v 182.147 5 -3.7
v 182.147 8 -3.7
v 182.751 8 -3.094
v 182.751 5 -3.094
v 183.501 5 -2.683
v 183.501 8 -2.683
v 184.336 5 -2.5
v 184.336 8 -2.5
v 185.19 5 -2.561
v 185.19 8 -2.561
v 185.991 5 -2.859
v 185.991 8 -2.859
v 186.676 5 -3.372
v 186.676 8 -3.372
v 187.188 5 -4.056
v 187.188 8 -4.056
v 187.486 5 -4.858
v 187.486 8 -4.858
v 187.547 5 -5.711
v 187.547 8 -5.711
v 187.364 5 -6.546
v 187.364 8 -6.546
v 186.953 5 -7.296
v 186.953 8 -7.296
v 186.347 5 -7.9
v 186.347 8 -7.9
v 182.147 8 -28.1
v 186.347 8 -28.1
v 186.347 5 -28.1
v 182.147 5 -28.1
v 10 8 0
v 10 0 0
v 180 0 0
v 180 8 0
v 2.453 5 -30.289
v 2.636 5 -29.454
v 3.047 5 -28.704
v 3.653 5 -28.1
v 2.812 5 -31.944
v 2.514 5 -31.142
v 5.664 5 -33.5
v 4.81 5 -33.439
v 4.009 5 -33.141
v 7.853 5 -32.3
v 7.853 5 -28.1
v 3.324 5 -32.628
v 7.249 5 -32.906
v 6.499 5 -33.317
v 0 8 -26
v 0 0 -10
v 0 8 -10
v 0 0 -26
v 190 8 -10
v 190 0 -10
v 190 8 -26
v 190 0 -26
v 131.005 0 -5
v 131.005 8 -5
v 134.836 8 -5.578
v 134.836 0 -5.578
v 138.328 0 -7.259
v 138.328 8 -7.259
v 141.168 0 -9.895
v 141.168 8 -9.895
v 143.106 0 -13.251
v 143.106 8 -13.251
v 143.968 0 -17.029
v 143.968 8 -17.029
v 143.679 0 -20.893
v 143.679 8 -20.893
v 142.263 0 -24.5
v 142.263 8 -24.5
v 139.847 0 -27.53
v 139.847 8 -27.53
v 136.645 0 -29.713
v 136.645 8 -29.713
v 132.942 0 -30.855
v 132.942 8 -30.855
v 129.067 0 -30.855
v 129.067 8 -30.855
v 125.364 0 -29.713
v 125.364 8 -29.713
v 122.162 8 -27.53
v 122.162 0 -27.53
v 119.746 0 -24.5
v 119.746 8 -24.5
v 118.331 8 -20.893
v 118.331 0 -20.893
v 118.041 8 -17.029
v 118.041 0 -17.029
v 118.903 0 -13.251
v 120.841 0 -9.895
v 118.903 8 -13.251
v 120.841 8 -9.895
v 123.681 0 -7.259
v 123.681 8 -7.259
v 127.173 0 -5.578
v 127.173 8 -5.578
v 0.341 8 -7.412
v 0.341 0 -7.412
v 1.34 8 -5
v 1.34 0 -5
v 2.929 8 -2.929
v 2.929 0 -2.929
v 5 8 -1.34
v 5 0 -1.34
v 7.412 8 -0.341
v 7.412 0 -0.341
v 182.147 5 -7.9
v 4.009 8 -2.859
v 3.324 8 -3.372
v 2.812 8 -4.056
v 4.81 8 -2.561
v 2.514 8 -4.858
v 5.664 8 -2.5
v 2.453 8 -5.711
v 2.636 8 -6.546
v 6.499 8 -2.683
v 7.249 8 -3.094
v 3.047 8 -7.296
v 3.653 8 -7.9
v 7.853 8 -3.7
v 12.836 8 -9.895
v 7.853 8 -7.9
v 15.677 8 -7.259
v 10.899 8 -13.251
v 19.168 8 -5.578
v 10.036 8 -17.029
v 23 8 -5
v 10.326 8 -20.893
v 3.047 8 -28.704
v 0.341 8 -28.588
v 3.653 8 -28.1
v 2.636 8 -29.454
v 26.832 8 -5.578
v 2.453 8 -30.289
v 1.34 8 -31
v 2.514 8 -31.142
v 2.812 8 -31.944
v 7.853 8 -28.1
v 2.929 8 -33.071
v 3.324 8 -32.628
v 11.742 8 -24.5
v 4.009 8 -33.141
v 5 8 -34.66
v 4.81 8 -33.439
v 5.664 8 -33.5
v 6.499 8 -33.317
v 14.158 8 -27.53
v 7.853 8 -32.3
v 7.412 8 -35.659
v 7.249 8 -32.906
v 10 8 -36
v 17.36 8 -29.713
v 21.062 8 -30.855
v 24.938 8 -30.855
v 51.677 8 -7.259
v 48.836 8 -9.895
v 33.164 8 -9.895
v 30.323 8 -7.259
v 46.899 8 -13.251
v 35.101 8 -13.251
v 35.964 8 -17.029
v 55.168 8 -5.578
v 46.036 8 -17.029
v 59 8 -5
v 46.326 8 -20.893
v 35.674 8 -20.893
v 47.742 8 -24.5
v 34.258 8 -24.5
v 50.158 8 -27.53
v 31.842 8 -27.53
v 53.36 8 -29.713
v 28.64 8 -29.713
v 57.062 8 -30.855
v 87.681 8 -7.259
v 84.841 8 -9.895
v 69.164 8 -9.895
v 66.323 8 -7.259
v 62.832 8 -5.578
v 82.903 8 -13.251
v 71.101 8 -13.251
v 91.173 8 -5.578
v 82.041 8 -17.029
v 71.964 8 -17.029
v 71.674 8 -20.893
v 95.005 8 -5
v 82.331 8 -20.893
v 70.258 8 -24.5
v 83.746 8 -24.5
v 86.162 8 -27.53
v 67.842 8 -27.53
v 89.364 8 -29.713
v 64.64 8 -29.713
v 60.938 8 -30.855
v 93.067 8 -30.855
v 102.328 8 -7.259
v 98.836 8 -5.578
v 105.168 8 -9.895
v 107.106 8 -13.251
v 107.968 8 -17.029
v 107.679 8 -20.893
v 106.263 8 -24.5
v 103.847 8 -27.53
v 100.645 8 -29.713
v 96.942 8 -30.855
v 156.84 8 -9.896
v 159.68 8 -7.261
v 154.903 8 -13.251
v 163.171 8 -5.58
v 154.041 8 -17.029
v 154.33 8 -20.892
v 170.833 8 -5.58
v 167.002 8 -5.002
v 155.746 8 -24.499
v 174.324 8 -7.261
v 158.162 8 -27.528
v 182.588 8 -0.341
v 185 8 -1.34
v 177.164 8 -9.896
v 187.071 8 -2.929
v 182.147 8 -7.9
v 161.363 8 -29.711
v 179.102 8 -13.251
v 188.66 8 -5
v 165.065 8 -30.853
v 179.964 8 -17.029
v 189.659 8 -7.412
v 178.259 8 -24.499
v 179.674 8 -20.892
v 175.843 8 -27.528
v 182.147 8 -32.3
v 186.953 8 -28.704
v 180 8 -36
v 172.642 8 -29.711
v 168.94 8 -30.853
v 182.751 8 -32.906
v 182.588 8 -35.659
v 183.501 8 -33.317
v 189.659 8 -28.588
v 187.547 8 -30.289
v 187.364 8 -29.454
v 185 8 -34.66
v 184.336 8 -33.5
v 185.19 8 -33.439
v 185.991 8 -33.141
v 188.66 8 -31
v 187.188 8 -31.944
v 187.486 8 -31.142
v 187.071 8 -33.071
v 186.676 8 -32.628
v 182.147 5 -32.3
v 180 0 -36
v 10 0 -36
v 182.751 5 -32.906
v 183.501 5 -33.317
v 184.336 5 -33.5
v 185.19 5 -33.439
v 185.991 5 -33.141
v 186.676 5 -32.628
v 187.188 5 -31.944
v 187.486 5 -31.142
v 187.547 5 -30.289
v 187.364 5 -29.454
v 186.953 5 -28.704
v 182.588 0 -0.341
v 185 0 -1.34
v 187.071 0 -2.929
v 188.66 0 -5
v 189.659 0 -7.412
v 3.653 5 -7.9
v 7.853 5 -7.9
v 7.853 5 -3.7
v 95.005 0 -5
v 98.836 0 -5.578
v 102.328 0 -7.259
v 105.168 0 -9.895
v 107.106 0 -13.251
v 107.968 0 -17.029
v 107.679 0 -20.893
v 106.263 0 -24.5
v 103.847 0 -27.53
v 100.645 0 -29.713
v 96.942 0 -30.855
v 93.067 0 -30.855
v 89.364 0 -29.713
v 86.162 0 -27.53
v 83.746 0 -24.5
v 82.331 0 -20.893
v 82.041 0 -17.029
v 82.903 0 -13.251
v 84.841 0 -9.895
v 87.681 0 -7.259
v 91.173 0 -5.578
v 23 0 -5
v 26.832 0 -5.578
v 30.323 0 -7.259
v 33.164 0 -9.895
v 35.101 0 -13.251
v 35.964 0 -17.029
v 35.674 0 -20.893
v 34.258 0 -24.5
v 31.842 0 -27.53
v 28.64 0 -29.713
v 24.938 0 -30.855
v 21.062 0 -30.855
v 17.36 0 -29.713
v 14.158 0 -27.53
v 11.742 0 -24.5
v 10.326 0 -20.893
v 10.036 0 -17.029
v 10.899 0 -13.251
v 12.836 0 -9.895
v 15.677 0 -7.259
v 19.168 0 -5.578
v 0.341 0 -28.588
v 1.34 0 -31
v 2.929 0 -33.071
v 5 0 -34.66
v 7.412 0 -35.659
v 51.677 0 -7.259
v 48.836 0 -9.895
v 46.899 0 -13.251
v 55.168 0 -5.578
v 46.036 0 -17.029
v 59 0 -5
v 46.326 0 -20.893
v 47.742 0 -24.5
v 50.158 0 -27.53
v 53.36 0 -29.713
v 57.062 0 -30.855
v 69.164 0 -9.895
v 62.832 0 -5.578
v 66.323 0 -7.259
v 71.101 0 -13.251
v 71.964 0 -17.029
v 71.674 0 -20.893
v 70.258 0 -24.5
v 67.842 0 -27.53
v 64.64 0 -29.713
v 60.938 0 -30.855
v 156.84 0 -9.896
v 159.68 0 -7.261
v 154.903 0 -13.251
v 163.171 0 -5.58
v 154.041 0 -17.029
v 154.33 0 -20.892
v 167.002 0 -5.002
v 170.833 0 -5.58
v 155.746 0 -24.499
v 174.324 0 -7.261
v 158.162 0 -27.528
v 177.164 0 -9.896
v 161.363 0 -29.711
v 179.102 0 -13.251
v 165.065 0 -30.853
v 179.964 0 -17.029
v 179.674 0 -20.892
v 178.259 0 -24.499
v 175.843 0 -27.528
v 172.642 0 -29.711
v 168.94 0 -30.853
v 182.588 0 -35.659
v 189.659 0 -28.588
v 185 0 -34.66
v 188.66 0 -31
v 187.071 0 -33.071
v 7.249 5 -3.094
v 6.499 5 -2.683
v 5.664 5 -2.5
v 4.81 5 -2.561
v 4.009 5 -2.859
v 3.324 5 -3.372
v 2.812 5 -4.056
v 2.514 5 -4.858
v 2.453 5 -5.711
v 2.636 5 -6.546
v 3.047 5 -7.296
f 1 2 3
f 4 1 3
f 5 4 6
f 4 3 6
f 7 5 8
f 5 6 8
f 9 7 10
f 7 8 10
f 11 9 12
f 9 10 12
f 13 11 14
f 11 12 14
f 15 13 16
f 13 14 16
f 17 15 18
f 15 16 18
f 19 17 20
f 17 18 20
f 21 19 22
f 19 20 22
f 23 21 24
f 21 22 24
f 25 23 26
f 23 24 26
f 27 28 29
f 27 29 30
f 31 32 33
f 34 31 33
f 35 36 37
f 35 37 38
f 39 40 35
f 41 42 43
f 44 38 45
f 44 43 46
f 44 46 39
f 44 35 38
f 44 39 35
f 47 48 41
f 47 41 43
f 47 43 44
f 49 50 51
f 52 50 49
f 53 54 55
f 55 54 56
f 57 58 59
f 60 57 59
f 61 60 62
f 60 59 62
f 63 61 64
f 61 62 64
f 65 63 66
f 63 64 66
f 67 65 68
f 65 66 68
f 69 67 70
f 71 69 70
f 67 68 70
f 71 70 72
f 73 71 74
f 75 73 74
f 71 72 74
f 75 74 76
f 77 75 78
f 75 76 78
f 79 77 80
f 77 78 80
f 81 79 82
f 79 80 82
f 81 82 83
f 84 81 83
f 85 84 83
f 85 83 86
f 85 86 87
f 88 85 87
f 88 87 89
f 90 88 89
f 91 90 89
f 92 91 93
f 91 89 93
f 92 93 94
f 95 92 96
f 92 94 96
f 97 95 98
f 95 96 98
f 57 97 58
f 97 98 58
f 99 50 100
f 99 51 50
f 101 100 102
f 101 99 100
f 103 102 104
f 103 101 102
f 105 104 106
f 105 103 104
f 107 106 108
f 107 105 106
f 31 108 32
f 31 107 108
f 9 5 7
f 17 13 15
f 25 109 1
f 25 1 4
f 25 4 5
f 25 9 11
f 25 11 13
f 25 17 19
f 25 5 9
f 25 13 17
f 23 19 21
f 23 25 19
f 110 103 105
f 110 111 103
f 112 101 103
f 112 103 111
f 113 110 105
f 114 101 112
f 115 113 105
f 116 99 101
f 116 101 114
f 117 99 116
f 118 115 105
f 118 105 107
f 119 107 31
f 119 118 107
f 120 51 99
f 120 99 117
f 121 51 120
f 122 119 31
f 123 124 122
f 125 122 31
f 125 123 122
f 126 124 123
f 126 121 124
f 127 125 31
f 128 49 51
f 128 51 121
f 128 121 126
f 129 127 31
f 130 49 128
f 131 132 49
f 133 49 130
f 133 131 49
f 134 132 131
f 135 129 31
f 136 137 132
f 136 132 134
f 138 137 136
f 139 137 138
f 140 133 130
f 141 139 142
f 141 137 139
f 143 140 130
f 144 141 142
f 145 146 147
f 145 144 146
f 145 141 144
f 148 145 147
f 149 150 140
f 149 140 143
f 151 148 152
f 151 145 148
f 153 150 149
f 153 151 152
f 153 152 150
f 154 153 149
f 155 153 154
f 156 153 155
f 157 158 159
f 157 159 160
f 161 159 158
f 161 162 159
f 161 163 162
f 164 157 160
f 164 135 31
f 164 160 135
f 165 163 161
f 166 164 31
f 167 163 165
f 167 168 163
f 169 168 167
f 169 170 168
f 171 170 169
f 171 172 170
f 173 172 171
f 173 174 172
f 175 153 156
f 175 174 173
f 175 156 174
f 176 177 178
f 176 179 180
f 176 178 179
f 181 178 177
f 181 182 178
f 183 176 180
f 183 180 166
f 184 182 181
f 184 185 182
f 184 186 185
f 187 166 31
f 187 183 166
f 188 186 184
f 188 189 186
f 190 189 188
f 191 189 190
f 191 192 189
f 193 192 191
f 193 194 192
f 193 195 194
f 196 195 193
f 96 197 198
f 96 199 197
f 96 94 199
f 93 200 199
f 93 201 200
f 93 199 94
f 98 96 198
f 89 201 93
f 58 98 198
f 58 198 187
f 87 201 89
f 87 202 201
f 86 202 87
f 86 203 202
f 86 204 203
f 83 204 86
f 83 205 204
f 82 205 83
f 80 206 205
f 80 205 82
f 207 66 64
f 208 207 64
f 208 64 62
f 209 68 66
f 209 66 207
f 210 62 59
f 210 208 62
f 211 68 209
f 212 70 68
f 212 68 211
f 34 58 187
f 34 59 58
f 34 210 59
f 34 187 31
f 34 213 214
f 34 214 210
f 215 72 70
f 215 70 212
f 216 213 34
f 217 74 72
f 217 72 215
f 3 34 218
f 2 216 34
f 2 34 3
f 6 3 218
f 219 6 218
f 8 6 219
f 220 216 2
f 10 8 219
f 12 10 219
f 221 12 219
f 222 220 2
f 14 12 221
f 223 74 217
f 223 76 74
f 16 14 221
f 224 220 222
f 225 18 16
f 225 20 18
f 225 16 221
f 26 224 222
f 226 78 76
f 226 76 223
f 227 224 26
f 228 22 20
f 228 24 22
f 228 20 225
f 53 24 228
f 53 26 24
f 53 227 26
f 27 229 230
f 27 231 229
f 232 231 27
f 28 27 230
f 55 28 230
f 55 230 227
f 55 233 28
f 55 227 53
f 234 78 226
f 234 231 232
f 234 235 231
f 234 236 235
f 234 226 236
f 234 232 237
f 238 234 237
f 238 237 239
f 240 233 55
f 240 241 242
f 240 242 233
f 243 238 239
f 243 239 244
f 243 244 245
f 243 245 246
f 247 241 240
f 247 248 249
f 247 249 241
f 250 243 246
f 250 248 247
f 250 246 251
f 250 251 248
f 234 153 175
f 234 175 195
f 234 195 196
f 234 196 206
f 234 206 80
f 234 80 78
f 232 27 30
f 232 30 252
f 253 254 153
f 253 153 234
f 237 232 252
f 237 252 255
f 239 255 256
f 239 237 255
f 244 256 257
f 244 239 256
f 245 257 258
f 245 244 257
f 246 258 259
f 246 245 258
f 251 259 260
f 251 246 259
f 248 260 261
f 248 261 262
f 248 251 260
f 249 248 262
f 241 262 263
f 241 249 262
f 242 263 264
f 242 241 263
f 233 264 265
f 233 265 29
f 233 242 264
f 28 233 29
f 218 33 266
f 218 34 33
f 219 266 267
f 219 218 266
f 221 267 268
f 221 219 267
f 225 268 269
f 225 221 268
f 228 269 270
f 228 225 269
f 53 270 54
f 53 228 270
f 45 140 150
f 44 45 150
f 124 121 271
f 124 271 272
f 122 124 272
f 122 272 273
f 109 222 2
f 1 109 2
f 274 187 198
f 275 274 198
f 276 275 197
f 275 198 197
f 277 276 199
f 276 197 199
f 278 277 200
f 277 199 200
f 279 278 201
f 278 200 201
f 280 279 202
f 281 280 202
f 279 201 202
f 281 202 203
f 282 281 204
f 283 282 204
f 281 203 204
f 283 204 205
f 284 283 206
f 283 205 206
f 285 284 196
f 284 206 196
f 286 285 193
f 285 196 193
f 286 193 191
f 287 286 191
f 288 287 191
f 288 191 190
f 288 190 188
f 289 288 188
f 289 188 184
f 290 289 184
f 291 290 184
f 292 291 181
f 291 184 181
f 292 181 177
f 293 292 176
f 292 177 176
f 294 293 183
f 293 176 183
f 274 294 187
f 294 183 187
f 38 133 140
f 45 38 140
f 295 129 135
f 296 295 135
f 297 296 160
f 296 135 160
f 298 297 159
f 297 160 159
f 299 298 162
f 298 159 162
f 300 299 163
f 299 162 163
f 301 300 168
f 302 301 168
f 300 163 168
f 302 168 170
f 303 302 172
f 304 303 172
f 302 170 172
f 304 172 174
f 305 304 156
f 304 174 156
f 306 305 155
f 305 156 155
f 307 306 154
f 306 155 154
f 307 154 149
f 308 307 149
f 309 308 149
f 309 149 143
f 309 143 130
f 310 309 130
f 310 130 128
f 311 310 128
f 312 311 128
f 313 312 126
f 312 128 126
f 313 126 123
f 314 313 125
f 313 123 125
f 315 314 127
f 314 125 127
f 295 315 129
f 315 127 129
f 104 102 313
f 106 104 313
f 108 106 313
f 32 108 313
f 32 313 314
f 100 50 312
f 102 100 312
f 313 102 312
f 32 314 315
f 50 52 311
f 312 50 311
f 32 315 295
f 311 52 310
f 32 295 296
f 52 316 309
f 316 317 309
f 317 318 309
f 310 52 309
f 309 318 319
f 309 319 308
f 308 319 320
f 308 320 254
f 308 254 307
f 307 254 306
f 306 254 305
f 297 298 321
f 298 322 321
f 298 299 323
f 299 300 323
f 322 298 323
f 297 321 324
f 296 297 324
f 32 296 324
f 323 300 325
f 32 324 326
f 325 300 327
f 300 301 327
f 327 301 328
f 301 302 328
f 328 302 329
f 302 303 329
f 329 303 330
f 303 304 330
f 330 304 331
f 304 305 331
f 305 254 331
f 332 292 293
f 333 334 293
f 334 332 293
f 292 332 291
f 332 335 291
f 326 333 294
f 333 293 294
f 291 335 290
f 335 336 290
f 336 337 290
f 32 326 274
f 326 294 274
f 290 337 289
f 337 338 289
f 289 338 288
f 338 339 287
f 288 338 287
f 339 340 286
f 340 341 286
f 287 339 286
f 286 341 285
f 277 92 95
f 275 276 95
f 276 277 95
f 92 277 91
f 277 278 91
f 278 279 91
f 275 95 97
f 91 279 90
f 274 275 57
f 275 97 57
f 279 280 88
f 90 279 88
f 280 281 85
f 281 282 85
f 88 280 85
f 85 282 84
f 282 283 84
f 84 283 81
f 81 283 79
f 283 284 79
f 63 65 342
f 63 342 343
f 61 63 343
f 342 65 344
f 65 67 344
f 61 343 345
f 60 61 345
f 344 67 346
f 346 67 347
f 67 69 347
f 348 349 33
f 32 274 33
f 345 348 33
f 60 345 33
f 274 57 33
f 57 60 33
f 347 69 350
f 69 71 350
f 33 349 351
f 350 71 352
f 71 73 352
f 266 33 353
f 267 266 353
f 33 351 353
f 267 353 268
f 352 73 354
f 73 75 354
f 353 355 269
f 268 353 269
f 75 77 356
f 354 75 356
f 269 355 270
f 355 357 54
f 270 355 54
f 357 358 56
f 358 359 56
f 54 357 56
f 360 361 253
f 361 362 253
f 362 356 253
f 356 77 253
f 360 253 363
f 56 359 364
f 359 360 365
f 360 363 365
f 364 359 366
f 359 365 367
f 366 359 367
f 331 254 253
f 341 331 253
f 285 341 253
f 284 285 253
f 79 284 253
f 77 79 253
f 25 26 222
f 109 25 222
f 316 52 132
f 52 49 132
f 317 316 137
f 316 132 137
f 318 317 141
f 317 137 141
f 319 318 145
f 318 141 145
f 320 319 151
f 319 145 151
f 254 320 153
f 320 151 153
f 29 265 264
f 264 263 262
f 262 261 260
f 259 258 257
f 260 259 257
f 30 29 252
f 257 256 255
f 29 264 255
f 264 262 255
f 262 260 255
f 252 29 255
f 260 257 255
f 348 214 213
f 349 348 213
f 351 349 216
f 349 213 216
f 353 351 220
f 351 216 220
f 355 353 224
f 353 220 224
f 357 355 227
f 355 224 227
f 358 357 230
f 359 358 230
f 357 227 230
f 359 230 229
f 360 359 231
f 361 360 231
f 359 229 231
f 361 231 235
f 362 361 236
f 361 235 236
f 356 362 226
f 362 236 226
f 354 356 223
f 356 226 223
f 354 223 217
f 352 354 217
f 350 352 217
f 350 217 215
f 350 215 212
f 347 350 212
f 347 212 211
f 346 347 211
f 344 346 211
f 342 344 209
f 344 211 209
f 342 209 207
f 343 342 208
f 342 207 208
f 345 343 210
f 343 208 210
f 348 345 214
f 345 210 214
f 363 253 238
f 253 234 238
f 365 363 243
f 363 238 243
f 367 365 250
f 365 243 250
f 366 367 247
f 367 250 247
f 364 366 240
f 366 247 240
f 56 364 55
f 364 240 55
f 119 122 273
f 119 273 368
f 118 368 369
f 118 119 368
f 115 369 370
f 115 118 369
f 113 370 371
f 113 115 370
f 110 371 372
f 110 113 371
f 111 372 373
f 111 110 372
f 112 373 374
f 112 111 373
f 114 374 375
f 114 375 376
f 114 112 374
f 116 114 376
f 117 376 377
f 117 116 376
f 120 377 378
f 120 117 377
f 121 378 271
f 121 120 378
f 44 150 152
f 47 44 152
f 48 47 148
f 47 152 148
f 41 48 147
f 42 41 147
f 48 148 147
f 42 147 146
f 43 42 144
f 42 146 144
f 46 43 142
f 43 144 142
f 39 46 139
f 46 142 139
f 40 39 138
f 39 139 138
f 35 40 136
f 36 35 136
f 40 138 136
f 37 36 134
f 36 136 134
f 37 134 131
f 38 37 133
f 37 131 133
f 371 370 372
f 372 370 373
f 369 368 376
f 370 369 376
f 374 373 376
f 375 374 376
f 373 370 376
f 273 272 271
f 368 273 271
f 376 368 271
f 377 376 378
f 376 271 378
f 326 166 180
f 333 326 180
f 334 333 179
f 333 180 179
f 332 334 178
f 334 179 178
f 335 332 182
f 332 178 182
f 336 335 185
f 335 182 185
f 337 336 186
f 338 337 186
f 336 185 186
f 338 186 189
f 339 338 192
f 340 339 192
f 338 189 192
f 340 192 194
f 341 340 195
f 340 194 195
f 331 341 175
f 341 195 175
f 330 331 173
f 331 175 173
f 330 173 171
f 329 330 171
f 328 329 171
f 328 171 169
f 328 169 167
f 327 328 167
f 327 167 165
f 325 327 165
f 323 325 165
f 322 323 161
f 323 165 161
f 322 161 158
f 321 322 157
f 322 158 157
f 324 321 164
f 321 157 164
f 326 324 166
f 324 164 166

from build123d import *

# Parameters (mm, degrees)
SKETCH5_W           = 190
SKETCH5_H           = 36
BOSS_EXTRUDE1_DEPTH = 8
SKETCH6_R           = 13
SKETCH6_R_2         = 12.99768992
CUT_EXTRUDE1_DEPTH  = 8
FILLET2_R           = 10
CUT_EXTRUDE2_DEPTH  = 3


with BuildPart() as part:
    # Sketch5 → Boss-Extrude1 (new body)
    with BuildSketch(Plane(origin=(0, 0, 0), x_dir=(1, 0, 0), z_dir=(0, 1, 0))):
        with Locations((95, 18)):
            Rectangle(SKETCH5_W, SKETCH5_H)
    extrude(amount=BOSS_EXTRUDE1_DEPTH)

    # Sketch6 → Cut-Extrude1 (cut)
    with BuildSketch(Plane(origin=(0, 8, 0), x_dir=(1, 0, 0), z_dir=(0, 1, 0))):
        with Locations(Location((23, 18, 0), (0, 0, 270))):
            Circle(SKETCH6_R)
        with Locations(Location((59, 18, 0), (0, 0, 270))):
            Circle(SKETCH6_R)
        with Locations(Location((95.004620161, 18, 0), (0, 0, 270))):
            Circle(SKETCH6_R)
        with Locations(Location((131.004620161, 18, 0), (0, 0, 270))):
            Circle(SKETCH6_R)
        with Locations(Location((167.00231008, 18, 0), (0, 0, 270))):
            Circle(SKETCH6_R_2)
    extrude(amount=-CUT_EXTRUDE1_DEPTH, mode=Mode.SUBTRACT)

    # Fillet2
    fillet2_edges = [part.edges().sort_by_distance(p)[0] for p in [
        (0, 4, -36),
        (190, 4, -36),
        (190, 4, 0),
        (0, 4, 0),
    ]]
    fillet(fillet2_edges, radius=FILLET2_R)

    # Sketch7 → Cut-Extrude2 (cut)
    with BuildSketch(Plane(origin=(0, 8, 0), x_dir=(1, 0, 0), z_dir=(0, 1, 0))):
        with BuildLine():
            Line((3.652564445, 28.100196169), (7.852564445, 28.100196169))
            Line((7.852564445, 28.100196169), (7.852564445, 32.300196169))
            ThreePointArc((7.852564445, 32.300196169), (3.324368465, 32.628392149), (3.652564445, 28.100196169))
        make_face()
        with BuildLine():
            Line((3.652564445, 7.899803831), (7.852564445, 7.899803831))
            Line((7.852564445, 7.899803831), (7.852564445, 3.699803831))
            ThreePointArc((7.852564445, 3.699803831), (3.324368465, 3.371607851), (3.652564445, 7.899803831))
        make_face()
        with BuildLine():
            Line((186.347435555, 28.100196169), (182.147435555, 28.100196169))
            Line((182.147435555, 28.100196169), (182.147435555, 32.300196169))
            ThreePointArc((182.147435555, 32.300196169), (186.675631535, 32.628392149), (186.347435555, 28.100196169))
        make_face()
        with BuildLine():
            Line((182.147435555, 7.899803831), (182.147435555, 3.699803831))
            ThreePointArc((182.147435555, 3.699803831), (186.675631535, 3.371607851), (186.347435555, 7.899803831))
            Line((186.347435555, 7.899803831), (182.147435555, 7.899803831))
        make_face()
    extrude(amount=-CUT_EXTRUDE2_DEPTH, mode=Mode.SUBTRACT)


solid = part.part
